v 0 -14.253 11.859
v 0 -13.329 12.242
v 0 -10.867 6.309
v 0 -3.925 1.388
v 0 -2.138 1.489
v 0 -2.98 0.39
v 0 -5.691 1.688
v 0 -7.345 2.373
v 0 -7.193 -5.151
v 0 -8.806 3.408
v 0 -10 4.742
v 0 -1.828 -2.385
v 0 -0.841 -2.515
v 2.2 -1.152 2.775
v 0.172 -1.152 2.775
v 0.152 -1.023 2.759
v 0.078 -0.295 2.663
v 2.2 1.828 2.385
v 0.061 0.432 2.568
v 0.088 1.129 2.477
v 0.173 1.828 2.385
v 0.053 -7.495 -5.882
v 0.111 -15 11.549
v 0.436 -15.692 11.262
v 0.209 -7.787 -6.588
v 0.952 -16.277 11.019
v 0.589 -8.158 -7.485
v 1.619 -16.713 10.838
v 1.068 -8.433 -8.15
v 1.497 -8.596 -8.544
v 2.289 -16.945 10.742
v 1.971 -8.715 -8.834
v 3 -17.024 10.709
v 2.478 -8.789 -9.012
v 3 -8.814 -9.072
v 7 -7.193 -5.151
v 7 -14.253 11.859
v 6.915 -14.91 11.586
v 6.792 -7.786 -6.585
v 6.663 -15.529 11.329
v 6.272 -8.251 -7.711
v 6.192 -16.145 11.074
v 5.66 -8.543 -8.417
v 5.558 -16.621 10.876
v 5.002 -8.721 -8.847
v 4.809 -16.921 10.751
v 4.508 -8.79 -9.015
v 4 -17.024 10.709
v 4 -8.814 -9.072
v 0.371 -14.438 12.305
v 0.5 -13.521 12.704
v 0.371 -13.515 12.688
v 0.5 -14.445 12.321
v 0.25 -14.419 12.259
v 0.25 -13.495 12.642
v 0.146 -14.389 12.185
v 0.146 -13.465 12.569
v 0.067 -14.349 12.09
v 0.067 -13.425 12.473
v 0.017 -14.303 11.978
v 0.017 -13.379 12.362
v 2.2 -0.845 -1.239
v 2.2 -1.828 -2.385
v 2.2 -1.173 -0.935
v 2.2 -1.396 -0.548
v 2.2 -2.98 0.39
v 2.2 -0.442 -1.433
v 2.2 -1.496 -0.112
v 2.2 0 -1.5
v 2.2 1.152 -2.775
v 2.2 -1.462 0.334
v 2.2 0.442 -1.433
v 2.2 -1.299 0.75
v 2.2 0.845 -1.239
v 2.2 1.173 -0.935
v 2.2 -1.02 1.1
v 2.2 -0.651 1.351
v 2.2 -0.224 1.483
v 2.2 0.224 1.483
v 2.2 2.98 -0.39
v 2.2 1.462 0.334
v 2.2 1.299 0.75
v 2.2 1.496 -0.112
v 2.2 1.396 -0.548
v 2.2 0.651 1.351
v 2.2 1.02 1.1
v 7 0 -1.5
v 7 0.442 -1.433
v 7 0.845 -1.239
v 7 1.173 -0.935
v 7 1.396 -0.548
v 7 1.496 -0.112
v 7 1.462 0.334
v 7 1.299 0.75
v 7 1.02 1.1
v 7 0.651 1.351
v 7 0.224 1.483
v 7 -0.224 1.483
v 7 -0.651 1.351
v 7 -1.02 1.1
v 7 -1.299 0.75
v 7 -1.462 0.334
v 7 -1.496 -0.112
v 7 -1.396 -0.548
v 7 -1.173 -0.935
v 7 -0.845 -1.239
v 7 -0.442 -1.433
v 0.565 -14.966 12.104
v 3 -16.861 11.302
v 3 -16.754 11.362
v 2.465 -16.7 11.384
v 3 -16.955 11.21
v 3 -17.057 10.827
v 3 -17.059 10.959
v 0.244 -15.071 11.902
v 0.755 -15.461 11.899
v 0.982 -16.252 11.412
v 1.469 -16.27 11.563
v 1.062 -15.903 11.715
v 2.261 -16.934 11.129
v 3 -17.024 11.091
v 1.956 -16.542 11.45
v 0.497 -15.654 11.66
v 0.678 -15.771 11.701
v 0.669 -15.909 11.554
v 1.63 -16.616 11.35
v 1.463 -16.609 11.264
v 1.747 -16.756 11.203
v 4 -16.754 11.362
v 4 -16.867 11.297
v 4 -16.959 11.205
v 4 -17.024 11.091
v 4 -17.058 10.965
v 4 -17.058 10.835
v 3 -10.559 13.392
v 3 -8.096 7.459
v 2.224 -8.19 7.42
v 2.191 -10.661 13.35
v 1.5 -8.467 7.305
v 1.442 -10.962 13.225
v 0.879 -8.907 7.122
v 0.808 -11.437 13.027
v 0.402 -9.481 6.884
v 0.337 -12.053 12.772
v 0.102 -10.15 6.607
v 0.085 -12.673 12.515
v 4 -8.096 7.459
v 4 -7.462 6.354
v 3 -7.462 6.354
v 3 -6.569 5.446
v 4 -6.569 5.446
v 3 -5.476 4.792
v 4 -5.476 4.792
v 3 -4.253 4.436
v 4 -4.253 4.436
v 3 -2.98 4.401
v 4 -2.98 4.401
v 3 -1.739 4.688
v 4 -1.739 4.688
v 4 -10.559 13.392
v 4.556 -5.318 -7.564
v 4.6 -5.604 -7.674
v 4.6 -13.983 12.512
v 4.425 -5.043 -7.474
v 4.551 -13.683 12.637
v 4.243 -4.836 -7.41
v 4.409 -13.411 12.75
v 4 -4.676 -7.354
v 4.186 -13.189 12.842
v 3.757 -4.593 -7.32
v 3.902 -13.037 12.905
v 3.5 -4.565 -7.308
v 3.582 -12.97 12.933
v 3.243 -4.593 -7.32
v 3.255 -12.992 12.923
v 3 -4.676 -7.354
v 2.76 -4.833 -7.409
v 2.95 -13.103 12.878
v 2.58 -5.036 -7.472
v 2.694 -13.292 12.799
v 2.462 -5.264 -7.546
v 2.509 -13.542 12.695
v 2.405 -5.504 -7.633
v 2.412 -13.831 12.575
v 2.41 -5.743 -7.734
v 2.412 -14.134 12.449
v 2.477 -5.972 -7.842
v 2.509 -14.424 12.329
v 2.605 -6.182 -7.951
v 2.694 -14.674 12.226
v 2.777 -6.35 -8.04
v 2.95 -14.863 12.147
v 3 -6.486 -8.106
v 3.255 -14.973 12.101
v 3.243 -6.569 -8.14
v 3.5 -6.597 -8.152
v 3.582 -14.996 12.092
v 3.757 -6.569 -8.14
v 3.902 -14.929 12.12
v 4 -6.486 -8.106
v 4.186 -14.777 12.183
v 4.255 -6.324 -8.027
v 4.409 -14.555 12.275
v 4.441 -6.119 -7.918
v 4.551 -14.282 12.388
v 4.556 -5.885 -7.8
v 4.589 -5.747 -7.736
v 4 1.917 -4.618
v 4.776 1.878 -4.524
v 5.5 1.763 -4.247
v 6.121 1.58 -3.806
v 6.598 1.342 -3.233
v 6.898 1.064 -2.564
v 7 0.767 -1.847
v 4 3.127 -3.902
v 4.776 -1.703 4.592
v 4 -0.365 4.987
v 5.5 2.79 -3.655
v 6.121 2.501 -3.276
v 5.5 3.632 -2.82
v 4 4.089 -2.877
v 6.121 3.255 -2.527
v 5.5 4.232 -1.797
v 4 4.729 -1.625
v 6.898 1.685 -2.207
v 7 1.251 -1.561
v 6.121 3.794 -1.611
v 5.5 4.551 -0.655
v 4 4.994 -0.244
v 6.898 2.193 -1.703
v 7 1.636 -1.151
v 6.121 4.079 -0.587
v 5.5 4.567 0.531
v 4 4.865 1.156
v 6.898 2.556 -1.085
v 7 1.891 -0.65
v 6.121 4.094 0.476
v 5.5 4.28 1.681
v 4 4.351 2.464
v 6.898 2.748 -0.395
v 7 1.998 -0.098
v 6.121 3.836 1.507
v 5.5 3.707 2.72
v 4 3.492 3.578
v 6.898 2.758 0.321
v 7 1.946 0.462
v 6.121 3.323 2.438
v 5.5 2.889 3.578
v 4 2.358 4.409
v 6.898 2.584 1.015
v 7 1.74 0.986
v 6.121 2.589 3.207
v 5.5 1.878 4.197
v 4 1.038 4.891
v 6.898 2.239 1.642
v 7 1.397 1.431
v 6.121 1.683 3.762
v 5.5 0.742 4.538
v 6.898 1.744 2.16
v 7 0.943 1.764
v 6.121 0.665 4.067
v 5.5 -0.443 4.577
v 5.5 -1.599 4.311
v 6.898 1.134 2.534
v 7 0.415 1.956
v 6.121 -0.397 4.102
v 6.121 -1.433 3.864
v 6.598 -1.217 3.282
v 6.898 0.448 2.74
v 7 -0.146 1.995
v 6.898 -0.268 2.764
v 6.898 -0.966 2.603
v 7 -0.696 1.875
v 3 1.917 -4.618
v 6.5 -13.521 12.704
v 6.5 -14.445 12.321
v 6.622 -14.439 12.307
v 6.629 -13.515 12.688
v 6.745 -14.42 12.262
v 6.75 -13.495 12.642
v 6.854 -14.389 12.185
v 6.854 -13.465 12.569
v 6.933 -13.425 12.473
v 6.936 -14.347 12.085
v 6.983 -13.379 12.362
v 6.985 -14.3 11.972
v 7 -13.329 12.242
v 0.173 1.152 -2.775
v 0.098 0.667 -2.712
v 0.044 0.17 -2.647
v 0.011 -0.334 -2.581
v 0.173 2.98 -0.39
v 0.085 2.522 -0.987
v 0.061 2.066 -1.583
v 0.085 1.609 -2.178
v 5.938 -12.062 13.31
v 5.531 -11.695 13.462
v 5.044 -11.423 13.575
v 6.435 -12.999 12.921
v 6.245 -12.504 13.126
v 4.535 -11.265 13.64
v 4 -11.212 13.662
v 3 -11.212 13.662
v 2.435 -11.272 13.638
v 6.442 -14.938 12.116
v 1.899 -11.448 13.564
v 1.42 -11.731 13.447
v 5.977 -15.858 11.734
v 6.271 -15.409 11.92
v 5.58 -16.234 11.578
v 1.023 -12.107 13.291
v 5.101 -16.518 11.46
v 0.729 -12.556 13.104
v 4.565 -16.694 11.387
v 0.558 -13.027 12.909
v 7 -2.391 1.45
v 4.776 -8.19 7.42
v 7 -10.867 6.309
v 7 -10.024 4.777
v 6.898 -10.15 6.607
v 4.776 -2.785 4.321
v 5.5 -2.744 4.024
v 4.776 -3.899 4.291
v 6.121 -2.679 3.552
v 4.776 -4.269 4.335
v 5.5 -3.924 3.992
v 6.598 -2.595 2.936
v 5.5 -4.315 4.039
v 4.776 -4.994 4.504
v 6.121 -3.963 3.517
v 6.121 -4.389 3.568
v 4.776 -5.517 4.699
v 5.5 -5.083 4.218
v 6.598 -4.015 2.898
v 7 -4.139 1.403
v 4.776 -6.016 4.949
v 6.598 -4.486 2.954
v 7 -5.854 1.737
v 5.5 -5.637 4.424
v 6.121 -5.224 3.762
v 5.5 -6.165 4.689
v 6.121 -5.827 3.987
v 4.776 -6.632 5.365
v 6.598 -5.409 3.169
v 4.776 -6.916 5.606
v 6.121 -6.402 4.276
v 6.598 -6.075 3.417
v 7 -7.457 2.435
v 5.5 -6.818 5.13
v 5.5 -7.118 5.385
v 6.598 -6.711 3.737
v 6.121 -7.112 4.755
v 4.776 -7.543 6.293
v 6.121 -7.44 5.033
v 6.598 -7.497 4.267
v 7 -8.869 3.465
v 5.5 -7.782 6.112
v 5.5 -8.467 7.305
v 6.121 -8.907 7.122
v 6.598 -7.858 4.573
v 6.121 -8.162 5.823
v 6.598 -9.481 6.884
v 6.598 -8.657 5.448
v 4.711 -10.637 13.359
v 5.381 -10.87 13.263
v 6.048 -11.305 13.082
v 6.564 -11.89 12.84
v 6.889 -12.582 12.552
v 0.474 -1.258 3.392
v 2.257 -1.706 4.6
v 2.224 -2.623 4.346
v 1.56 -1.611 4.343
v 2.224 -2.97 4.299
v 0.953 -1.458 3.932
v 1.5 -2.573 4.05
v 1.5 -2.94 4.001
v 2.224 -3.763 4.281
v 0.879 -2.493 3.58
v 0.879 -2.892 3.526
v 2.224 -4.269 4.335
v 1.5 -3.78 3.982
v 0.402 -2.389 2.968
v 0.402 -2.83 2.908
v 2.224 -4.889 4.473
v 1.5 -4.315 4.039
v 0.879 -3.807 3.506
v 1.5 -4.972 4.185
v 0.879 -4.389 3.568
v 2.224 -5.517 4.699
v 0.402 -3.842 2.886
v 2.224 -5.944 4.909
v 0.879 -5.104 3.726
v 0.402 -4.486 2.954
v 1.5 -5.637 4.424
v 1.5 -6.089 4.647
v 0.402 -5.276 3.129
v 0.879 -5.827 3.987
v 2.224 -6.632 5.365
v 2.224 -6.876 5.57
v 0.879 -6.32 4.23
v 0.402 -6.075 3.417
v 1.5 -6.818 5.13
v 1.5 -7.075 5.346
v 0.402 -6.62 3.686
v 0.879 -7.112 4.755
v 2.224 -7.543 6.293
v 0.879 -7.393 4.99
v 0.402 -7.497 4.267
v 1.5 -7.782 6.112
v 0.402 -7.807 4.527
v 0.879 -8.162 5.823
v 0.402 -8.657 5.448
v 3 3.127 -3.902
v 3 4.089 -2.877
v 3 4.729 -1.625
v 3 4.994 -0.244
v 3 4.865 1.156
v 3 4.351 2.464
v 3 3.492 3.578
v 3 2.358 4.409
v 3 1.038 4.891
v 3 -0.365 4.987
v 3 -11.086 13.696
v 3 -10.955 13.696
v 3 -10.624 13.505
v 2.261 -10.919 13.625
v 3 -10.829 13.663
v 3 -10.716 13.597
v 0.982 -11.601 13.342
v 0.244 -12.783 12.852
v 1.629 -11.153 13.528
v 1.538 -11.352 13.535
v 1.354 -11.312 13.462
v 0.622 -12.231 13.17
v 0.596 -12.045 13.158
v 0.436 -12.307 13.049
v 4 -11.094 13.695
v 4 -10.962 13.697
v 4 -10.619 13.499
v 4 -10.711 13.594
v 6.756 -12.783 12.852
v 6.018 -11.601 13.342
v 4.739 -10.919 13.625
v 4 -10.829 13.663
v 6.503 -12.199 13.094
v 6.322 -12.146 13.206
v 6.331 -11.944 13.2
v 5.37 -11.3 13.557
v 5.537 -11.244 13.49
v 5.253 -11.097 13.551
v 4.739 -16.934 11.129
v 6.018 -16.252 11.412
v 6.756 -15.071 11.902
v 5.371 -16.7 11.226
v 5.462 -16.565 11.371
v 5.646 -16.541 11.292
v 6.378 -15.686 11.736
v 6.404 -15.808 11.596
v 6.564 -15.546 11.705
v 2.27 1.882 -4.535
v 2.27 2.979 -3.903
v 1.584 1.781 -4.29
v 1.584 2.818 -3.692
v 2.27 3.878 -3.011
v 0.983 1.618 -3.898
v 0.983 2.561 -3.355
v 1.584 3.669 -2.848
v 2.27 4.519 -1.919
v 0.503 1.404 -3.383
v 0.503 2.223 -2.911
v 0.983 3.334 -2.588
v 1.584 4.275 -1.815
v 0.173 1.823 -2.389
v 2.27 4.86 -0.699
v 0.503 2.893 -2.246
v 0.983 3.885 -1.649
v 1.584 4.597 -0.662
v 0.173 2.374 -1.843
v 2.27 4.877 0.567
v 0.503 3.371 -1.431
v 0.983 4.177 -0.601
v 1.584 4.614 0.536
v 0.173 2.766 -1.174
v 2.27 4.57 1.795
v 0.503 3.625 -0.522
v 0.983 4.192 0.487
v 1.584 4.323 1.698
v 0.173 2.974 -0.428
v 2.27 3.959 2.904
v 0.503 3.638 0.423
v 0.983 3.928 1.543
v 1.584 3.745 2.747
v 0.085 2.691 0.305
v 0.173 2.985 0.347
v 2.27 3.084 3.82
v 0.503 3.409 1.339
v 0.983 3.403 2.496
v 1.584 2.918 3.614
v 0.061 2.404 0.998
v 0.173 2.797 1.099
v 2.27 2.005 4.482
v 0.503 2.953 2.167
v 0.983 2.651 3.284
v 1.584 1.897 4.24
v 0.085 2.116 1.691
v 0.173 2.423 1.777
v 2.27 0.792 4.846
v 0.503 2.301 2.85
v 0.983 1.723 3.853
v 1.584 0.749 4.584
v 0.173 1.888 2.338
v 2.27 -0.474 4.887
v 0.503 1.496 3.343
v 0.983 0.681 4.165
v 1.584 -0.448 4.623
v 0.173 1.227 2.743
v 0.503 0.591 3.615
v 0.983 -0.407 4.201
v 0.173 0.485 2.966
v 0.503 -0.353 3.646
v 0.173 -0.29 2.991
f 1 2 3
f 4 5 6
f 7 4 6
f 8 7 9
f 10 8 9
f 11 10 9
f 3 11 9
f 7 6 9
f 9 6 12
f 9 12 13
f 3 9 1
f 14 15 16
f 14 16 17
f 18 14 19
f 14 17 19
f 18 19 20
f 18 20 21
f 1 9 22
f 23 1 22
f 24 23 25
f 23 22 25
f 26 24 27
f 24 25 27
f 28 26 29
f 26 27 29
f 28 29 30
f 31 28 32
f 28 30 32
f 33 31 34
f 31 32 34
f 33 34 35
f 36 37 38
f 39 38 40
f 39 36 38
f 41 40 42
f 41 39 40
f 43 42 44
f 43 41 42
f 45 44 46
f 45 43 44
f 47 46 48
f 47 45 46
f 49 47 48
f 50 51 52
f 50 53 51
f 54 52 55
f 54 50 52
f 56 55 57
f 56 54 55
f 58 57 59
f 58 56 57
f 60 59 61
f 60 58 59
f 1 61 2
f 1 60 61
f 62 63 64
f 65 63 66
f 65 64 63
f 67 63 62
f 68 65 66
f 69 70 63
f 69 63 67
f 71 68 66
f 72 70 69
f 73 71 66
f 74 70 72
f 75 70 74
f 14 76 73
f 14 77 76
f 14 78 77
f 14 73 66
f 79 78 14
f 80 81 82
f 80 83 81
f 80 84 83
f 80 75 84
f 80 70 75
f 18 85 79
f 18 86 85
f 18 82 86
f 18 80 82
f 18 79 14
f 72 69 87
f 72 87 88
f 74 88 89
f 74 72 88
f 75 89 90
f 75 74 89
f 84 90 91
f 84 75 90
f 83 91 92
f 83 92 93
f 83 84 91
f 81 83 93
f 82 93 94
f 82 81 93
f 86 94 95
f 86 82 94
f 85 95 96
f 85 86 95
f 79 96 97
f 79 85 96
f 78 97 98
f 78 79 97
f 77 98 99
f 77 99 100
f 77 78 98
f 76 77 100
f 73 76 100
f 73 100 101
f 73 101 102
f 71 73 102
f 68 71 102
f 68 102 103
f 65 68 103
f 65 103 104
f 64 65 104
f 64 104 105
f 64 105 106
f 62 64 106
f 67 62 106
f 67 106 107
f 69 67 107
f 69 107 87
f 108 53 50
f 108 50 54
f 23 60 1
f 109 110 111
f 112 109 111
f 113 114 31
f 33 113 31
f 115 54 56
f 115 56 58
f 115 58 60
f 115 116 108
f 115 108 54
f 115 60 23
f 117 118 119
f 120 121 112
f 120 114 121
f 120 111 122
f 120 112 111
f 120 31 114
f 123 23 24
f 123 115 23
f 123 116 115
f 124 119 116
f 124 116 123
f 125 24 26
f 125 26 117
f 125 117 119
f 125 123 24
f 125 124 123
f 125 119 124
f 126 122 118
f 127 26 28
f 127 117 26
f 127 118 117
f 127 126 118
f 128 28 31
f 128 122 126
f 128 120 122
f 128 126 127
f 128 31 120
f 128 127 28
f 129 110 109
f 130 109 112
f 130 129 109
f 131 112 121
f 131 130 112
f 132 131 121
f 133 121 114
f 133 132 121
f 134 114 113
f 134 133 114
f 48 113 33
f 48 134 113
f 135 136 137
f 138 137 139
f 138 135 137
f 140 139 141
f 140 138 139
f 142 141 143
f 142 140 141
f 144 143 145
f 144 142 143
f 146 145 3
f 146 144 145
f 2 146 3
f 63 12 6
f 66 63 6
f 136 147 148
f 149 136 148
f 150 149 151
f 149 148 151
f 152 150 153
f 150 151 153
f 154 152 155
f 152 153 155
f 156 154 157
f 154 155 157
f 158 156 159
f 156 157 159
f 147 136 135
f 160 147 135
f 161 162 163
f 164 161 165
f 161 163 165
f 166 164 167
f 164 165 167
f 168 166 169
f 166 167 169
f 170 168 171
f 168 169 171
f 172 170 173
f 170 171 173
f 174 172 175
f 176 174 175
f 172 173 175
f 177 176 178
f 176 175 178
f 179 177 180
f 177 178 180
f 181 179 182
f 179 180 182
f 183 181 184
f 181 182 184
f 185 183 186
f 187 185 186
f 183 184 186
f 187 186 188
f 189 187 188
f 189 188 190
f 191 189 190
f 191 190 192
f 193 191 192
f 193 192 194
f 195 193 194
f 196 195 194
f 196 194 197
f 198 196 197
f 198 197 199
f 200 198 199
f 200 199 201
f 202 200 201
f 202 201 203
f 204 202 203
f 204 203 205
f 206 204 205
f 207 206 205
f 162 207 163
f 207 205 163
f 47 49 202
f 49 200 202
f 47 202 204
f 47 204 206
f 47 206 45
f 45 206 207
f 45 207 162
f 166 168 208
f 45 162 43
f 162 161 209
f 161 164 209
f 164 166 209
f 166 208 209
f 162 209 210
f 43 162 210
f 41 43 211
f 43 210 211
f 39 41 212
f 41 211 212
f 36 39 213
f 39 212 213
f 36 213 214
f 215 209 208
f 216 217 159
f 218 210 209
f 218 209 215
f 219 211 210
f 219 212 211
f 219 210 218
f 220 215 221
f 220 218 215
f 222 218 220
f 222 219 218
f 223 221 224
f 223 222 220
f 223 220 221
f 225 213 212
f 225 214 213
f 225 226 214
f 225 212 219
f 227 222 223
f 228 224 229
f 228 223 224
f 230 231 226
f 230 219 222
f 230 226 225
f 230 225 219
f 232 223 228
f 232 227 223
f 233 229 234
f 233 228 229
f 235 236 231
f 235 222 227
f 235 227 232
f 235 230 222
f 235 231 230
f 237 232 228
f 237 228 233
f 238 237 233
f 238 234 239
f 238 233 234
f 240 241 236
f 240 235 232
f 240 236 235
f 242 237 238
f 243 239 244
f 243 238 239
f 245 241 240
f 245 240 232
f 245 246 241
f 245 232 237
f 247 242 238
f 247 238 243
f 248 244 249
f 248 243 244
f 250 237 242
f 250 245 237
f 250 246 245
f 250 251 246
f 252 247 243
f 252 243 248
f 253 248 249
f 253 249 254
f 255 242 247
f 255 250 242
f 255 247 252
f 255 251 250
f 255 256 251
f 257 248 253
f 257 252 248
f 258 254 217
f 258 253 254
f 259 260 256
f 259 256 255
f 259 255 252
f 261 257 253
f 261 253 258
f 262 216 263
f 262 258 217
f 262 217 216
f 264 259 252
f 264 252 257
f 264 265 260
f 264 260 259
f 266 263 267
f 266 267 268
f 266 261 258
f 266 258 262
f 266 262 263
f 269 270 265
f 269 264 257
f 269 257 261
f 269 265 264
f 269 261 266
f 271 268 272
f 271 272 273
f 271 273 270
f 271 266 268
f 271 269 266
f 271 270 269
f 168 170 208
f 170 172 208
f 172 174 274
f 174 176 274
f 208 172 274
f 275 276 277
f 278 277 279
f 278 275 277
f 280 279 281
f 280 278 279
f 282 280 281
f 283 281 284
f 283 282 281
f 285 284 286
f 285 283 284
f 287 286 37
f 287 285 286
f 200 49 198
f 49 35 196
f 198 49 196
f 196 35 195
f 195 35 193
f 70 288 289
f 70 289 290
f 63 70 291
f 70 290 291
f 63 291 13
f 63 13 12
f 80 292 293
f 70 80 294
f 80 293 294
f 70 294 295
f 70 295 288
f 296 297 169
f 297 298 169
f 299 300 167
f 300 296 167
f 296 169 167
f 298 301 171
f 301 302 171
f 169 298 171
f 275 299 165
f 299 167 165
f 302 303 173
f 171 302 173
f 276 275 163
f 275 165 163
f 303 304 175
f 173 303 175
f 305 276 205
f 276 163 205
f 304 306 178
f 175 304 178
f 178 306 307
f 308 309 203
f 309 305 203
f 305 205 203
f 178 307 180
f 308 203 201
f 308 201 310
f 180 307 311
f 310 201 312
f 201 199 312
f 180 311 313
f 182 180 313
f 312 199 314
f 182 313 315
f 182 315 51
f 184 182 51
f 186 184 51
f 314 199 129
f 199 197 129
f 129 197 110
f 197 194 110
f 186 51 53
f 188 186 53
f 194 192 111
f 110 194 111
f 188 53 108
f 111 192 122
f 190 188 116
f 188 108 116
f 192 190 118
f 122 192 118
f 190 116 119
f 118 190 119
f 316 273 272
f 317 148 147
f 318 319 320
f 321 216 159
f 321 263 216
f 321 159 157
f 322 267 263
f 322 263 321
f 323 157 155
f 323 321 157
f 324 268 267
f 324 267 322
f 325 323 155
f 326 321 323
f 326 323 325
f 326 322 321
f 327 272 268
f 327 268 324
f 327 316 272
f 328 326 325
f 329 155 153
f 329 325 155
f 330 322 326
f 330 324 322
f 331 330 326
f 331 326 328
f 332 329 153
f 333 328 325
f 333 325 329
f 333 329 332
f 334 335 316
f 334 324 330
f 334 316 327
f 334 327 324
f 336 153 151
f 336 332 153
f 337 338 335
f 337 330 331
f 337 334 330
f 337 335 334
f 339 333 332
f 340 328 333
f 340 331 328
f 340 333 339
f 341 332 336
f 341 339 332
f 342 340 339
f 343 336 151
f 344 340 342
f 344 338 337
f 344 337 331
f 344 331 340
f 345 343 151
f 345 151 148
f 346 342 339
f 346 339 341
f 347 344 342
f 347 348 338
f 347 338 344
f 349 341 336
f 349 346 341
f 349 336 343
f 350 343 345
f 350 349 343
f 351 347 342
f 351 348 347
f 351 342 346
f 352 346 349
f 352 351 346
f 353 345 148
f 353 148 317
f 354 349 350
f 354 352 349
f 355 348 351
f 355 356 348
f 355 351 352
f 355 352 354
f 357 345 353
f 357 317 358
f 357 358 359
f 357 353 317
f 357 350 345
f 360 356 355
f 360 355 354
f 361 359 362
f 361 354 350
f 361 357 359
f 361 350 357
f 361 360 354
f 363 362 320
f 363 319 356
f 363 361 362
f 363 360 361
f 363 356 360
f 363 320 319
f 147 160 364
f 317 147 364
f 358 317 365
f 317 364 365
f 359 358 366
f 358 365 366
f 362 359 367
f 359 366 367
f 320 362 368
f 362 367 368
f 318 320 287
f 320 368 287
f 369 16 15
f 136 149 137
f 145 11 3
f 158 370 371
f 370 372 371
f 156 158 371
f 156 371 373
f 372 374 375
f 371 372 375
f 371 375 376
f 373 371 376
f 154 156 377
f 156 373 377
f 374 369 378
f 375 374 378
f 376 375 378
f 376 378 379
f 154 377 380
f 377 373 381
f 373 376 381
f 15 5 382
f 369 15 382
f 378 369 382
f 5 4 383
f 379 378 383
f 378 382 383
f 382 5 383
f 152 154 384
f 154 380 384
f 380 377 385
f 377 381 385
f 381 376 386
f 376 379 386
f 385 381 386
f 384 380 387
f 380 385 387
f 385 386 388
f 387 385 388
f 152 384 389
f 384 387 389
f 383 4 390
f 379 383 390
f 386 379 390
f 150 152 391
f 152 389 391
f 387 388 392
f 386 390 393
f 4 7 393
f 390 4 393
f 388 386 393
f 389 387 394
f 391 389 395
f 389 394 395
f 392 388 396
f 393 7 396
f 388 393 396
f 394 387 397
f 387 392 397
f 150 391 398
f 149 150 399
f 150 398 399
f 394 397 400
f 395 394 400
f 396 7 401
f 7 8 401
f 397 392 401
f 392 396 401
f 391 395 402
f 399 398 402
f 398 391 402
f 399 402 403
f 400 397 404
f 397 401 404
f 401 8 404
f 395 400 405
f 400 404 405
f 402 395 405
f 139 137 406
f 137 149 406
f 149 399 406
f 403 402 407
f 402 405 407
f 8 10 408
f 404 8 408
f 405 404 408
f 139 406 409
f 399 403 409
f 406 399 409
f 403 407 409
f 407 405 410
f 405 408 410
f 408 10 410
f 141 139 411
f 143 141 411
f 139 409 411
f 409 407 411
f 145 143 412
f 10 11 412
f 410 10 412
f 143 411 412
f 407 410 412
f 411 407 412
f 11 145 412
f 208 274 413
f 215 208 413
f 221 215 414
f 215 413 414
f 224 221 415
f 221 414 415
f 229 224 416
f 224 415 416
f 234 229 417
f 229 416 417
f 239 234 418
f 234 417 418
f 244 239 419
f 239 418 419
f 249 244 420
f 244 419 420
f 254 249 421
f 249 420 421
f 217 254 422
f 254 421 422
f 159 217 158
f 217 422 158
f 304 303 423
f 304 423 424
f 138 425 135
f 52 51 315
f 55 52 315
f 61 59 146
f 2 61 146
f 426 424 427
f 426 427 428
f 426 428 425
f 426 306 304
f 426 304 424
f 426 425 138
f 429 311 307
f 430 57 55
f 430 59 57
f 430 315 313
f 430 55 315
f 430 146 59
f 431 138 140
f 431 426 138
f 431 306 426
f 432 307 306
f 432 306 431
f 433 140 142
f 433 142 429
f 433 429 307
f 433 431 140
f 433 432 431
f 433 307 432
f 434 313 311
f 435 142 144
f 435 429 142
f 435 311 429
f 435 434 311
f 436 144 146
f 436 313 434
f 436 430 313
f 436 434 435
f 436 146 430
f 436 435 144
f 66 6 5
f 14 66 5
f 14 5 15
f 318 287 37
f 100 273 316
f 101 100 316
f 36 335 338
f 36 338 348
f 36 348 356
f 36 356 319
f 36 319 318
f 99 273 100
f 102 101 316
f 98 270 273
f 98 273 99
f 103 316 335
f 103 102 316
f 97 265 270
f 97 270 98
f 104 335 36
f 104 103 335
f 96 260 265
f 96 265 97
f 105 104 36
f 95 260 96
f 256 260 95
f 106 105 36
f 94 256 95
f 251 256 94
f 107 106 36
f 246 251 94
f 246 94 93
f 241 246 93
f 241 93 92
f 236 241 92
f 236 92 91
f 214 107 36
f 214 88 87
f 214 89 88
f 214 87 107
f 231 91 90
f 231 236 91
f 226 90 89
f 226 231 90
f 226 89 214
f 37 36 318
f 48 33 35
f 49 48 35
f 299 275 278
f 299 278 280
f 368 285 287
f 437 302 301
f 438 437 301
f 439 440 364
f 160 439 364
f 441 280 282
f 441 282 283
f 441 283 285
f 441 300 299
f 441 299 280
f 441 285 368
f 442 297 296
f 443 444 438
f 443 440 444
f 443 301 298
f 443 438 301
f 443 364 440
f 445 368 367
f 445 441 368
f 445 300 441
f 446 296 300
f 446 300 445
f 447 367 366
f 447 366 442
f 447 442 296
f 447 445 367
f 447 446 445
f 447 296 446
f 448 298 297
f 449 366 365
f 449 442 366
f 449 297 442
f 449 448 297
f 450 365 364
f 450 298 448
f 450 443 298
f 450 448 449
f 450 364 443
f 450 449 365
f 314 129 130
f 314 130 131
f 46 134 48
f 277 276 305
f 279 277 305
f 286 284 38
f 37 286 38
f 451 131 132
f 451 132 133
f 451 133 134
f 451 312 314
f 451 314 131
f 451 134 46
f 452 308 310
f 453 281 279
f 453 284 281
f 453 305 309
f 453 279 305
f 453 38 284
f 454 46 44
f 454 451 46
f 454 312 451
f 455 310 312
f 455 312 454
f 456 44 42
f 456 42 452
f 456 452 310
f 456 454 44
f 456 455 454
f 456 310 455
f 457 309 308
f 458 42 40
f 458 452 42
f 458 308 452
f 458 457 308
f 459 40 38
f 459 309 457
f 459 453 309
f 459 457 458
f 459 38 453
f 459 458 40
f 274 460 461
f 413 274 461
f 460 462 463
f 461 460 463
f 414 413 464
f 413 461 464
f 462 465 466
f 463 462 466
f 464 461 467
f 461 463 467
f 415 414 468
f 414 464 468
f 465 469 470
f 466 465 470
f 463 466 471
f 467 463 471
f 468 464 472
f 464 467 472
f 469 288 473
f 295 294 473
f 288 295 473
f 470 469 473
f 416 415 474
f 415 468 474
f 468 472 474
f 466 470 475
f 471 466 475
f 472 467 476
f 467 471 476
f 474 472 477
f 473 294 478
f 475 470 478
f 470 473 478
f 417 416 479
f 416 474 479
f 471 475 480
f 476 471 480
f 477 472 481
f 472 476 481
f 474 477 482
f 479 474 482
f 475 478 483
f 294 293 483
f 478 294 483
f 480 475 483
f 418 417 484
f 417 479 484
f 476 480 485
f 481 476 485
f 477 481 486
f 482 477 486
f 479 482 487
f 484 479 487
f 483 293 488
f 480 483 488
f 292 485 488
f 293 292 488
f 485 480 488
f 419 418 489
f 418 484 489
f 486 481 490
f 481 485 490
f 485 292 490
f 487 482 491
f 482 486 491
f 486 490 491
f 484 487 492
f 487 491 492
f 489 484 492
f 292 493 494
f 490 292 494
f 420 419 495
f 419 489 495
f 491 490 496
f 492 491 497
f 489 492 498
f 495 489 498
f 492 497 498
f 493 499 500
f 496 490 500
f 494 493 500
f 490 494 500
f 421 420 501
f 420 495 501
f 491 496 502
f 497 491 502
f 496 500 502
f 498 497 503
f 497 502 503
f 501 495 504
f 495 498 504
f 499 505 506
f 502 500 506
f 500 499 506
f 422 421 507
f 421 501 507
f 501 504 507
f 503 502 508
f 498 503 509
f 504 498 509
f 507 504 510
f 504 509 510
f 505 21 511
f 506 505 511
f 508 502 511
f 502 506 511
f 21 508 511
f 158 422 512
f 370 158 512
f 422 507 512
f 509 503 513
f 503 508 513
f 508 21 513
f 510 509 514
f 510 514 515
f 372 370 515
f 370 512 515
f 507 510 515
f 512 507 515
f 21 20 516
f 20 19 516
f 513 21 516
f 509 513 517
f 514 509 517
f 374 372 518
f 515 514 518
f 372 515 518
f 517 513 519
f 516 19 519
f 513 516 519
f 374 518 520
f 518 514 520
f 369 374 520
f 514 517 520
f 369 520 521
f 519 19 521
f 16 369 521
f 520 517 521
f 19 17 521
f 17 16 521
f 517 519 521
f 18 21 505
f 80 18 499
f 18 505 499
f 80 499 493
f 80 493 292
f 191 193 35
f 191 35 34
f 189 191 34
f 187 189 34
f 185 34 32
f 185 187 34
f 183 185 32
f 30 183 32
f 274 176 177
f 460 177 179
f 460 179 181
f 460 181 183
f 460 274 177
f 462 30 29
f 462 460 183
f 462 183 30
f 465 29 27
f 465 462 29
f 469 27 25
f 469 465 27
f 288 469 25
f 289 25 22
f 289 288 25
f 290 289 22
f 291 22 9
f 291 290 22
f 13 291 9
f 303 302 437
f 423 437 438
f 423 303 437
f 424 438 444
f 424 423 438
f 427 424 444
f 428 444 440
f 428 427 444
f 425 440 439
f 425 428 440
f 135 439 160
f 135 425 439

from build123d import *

# Parameters (mm, degrees)
SKETCH1_R           = 1.5
BOSS_EXTRUDE1_DEPTH = 7
FILLET1_R           = 5
FILLET2_R           = 3
SKETCH2_R           = 1.1
CUT_EXTRUDE1_DEPTH  = 28.212210096
CUT_EXTRUDE2_DEPTH  = 2.2
FILLET3_R           = 0.5


with BuildPart() as part:
    # Sketch1 → Boss-Extrude1 (new body)
    with BuildSketch(Plane(origin=(0, 0, 0), x_dir=(0, 0, -1), z_dir=(1, 0, 0))):
        with BuildLine():
            Line((0, -5), (-13.854054376, -10.750232807))
            Line((-13.854054376, -10.750232807), (-11.1706124, -17.215458183))
            Line((-11.1706124, -17.215458183), (9.071772057, -8.813699388))
            Line((9.071772057, -8.813699388), (4.618018125, 1.916744269))
            ThreePointArc((4.618018125, 1.916744269), (-4.158348311, 2.776353603), (0, -5))
        make_face()
        Circle(SKETCH1_R, mode=Mode.SUBTRACT)
    extrude(amount=BOSS_EXTRUDE1_DEPTH)

    # Fillet1
    fillet1_edges = [part.edges().sort_by_distance(p)[0] for p in [
        (3.5, -5, 0),
    ]]
    fillet(fillet1_edges, radius=FILLET1_R)

    # Fillet2
    fillet2_edges = [part.edges().sort_by_distance(p)[0] for p in [
        (7, -13.014578785, 1.049420171),
        (0, -9.423070941, 10.656519028),
        (7, -9.423070941, 10.656519028),
        (7, -3.44847756, -6.844895091),
        (0, -5.475900192, 4.79228393),
        (7, -5.475900192, 4.79228393),
        (7, 4.653790231, 1.828178461),
        (0, -3.44847756, -6.844895091),
        (0, -13.014578785, 1.049420171),
        (0, 4.653790231, 1.828178461),
    ]]
    fillet(fillet2_edges, radius=FILLET2_R)

    # Sketch2 → Cut-Extrude1 (cut, through all)
    with BuildSketch(Plane(origin=(0, -6.485014526, 15.624366332), x_dir=(1, 0, 0), z_dir=(0, -0.383348854, 0.923603625))):
        with Locations((3.5, -8.118018125)):
            Circle(SKETCH2_R)
    extrude(amount=-CUT_EXTRUDE1_DEPTH, mode=Mode.SUBTRACT)

    # Sketch3 → Cut-Extrude2 (cut)
    with BuildSketch(Plane.ZY):
        Polygon((2.385343934, 1.827610275), (-0.39008496, 2.979573581), (-2.775428893, 1.151963306), (-2.385343934, -1.827610275), (0.39008496, -2.979573581), (2.775428893, -1.151963306), align=None)
    extrude(amount=-CUT_EXTRUDE2_DEPTH, mode=Mode.SUBTRACT)

    # Fillet3
    fillet3_edges = [part.edges().sort_by_distance(p)[0] for p in [
        (0, -13.982845495, 12.512333388),
        (7, -13.982845495, 12.512333388),
        (3.5, -10.750232807, 13.854054376),
        (3.5, -17.215458183, 11.1706124),
        (6.121320344, -16.403906467, 11.507453239),
        (6.121320344, -11.561784523, 13.517213537),
        (0.878679656, -16.403906467, 11.507453239),
        (0.878679656, -11.561784523, 13.517213537),
    ]]
    fillet(fillet3_edges, radius=FILLET3_R)


solid = part.part
